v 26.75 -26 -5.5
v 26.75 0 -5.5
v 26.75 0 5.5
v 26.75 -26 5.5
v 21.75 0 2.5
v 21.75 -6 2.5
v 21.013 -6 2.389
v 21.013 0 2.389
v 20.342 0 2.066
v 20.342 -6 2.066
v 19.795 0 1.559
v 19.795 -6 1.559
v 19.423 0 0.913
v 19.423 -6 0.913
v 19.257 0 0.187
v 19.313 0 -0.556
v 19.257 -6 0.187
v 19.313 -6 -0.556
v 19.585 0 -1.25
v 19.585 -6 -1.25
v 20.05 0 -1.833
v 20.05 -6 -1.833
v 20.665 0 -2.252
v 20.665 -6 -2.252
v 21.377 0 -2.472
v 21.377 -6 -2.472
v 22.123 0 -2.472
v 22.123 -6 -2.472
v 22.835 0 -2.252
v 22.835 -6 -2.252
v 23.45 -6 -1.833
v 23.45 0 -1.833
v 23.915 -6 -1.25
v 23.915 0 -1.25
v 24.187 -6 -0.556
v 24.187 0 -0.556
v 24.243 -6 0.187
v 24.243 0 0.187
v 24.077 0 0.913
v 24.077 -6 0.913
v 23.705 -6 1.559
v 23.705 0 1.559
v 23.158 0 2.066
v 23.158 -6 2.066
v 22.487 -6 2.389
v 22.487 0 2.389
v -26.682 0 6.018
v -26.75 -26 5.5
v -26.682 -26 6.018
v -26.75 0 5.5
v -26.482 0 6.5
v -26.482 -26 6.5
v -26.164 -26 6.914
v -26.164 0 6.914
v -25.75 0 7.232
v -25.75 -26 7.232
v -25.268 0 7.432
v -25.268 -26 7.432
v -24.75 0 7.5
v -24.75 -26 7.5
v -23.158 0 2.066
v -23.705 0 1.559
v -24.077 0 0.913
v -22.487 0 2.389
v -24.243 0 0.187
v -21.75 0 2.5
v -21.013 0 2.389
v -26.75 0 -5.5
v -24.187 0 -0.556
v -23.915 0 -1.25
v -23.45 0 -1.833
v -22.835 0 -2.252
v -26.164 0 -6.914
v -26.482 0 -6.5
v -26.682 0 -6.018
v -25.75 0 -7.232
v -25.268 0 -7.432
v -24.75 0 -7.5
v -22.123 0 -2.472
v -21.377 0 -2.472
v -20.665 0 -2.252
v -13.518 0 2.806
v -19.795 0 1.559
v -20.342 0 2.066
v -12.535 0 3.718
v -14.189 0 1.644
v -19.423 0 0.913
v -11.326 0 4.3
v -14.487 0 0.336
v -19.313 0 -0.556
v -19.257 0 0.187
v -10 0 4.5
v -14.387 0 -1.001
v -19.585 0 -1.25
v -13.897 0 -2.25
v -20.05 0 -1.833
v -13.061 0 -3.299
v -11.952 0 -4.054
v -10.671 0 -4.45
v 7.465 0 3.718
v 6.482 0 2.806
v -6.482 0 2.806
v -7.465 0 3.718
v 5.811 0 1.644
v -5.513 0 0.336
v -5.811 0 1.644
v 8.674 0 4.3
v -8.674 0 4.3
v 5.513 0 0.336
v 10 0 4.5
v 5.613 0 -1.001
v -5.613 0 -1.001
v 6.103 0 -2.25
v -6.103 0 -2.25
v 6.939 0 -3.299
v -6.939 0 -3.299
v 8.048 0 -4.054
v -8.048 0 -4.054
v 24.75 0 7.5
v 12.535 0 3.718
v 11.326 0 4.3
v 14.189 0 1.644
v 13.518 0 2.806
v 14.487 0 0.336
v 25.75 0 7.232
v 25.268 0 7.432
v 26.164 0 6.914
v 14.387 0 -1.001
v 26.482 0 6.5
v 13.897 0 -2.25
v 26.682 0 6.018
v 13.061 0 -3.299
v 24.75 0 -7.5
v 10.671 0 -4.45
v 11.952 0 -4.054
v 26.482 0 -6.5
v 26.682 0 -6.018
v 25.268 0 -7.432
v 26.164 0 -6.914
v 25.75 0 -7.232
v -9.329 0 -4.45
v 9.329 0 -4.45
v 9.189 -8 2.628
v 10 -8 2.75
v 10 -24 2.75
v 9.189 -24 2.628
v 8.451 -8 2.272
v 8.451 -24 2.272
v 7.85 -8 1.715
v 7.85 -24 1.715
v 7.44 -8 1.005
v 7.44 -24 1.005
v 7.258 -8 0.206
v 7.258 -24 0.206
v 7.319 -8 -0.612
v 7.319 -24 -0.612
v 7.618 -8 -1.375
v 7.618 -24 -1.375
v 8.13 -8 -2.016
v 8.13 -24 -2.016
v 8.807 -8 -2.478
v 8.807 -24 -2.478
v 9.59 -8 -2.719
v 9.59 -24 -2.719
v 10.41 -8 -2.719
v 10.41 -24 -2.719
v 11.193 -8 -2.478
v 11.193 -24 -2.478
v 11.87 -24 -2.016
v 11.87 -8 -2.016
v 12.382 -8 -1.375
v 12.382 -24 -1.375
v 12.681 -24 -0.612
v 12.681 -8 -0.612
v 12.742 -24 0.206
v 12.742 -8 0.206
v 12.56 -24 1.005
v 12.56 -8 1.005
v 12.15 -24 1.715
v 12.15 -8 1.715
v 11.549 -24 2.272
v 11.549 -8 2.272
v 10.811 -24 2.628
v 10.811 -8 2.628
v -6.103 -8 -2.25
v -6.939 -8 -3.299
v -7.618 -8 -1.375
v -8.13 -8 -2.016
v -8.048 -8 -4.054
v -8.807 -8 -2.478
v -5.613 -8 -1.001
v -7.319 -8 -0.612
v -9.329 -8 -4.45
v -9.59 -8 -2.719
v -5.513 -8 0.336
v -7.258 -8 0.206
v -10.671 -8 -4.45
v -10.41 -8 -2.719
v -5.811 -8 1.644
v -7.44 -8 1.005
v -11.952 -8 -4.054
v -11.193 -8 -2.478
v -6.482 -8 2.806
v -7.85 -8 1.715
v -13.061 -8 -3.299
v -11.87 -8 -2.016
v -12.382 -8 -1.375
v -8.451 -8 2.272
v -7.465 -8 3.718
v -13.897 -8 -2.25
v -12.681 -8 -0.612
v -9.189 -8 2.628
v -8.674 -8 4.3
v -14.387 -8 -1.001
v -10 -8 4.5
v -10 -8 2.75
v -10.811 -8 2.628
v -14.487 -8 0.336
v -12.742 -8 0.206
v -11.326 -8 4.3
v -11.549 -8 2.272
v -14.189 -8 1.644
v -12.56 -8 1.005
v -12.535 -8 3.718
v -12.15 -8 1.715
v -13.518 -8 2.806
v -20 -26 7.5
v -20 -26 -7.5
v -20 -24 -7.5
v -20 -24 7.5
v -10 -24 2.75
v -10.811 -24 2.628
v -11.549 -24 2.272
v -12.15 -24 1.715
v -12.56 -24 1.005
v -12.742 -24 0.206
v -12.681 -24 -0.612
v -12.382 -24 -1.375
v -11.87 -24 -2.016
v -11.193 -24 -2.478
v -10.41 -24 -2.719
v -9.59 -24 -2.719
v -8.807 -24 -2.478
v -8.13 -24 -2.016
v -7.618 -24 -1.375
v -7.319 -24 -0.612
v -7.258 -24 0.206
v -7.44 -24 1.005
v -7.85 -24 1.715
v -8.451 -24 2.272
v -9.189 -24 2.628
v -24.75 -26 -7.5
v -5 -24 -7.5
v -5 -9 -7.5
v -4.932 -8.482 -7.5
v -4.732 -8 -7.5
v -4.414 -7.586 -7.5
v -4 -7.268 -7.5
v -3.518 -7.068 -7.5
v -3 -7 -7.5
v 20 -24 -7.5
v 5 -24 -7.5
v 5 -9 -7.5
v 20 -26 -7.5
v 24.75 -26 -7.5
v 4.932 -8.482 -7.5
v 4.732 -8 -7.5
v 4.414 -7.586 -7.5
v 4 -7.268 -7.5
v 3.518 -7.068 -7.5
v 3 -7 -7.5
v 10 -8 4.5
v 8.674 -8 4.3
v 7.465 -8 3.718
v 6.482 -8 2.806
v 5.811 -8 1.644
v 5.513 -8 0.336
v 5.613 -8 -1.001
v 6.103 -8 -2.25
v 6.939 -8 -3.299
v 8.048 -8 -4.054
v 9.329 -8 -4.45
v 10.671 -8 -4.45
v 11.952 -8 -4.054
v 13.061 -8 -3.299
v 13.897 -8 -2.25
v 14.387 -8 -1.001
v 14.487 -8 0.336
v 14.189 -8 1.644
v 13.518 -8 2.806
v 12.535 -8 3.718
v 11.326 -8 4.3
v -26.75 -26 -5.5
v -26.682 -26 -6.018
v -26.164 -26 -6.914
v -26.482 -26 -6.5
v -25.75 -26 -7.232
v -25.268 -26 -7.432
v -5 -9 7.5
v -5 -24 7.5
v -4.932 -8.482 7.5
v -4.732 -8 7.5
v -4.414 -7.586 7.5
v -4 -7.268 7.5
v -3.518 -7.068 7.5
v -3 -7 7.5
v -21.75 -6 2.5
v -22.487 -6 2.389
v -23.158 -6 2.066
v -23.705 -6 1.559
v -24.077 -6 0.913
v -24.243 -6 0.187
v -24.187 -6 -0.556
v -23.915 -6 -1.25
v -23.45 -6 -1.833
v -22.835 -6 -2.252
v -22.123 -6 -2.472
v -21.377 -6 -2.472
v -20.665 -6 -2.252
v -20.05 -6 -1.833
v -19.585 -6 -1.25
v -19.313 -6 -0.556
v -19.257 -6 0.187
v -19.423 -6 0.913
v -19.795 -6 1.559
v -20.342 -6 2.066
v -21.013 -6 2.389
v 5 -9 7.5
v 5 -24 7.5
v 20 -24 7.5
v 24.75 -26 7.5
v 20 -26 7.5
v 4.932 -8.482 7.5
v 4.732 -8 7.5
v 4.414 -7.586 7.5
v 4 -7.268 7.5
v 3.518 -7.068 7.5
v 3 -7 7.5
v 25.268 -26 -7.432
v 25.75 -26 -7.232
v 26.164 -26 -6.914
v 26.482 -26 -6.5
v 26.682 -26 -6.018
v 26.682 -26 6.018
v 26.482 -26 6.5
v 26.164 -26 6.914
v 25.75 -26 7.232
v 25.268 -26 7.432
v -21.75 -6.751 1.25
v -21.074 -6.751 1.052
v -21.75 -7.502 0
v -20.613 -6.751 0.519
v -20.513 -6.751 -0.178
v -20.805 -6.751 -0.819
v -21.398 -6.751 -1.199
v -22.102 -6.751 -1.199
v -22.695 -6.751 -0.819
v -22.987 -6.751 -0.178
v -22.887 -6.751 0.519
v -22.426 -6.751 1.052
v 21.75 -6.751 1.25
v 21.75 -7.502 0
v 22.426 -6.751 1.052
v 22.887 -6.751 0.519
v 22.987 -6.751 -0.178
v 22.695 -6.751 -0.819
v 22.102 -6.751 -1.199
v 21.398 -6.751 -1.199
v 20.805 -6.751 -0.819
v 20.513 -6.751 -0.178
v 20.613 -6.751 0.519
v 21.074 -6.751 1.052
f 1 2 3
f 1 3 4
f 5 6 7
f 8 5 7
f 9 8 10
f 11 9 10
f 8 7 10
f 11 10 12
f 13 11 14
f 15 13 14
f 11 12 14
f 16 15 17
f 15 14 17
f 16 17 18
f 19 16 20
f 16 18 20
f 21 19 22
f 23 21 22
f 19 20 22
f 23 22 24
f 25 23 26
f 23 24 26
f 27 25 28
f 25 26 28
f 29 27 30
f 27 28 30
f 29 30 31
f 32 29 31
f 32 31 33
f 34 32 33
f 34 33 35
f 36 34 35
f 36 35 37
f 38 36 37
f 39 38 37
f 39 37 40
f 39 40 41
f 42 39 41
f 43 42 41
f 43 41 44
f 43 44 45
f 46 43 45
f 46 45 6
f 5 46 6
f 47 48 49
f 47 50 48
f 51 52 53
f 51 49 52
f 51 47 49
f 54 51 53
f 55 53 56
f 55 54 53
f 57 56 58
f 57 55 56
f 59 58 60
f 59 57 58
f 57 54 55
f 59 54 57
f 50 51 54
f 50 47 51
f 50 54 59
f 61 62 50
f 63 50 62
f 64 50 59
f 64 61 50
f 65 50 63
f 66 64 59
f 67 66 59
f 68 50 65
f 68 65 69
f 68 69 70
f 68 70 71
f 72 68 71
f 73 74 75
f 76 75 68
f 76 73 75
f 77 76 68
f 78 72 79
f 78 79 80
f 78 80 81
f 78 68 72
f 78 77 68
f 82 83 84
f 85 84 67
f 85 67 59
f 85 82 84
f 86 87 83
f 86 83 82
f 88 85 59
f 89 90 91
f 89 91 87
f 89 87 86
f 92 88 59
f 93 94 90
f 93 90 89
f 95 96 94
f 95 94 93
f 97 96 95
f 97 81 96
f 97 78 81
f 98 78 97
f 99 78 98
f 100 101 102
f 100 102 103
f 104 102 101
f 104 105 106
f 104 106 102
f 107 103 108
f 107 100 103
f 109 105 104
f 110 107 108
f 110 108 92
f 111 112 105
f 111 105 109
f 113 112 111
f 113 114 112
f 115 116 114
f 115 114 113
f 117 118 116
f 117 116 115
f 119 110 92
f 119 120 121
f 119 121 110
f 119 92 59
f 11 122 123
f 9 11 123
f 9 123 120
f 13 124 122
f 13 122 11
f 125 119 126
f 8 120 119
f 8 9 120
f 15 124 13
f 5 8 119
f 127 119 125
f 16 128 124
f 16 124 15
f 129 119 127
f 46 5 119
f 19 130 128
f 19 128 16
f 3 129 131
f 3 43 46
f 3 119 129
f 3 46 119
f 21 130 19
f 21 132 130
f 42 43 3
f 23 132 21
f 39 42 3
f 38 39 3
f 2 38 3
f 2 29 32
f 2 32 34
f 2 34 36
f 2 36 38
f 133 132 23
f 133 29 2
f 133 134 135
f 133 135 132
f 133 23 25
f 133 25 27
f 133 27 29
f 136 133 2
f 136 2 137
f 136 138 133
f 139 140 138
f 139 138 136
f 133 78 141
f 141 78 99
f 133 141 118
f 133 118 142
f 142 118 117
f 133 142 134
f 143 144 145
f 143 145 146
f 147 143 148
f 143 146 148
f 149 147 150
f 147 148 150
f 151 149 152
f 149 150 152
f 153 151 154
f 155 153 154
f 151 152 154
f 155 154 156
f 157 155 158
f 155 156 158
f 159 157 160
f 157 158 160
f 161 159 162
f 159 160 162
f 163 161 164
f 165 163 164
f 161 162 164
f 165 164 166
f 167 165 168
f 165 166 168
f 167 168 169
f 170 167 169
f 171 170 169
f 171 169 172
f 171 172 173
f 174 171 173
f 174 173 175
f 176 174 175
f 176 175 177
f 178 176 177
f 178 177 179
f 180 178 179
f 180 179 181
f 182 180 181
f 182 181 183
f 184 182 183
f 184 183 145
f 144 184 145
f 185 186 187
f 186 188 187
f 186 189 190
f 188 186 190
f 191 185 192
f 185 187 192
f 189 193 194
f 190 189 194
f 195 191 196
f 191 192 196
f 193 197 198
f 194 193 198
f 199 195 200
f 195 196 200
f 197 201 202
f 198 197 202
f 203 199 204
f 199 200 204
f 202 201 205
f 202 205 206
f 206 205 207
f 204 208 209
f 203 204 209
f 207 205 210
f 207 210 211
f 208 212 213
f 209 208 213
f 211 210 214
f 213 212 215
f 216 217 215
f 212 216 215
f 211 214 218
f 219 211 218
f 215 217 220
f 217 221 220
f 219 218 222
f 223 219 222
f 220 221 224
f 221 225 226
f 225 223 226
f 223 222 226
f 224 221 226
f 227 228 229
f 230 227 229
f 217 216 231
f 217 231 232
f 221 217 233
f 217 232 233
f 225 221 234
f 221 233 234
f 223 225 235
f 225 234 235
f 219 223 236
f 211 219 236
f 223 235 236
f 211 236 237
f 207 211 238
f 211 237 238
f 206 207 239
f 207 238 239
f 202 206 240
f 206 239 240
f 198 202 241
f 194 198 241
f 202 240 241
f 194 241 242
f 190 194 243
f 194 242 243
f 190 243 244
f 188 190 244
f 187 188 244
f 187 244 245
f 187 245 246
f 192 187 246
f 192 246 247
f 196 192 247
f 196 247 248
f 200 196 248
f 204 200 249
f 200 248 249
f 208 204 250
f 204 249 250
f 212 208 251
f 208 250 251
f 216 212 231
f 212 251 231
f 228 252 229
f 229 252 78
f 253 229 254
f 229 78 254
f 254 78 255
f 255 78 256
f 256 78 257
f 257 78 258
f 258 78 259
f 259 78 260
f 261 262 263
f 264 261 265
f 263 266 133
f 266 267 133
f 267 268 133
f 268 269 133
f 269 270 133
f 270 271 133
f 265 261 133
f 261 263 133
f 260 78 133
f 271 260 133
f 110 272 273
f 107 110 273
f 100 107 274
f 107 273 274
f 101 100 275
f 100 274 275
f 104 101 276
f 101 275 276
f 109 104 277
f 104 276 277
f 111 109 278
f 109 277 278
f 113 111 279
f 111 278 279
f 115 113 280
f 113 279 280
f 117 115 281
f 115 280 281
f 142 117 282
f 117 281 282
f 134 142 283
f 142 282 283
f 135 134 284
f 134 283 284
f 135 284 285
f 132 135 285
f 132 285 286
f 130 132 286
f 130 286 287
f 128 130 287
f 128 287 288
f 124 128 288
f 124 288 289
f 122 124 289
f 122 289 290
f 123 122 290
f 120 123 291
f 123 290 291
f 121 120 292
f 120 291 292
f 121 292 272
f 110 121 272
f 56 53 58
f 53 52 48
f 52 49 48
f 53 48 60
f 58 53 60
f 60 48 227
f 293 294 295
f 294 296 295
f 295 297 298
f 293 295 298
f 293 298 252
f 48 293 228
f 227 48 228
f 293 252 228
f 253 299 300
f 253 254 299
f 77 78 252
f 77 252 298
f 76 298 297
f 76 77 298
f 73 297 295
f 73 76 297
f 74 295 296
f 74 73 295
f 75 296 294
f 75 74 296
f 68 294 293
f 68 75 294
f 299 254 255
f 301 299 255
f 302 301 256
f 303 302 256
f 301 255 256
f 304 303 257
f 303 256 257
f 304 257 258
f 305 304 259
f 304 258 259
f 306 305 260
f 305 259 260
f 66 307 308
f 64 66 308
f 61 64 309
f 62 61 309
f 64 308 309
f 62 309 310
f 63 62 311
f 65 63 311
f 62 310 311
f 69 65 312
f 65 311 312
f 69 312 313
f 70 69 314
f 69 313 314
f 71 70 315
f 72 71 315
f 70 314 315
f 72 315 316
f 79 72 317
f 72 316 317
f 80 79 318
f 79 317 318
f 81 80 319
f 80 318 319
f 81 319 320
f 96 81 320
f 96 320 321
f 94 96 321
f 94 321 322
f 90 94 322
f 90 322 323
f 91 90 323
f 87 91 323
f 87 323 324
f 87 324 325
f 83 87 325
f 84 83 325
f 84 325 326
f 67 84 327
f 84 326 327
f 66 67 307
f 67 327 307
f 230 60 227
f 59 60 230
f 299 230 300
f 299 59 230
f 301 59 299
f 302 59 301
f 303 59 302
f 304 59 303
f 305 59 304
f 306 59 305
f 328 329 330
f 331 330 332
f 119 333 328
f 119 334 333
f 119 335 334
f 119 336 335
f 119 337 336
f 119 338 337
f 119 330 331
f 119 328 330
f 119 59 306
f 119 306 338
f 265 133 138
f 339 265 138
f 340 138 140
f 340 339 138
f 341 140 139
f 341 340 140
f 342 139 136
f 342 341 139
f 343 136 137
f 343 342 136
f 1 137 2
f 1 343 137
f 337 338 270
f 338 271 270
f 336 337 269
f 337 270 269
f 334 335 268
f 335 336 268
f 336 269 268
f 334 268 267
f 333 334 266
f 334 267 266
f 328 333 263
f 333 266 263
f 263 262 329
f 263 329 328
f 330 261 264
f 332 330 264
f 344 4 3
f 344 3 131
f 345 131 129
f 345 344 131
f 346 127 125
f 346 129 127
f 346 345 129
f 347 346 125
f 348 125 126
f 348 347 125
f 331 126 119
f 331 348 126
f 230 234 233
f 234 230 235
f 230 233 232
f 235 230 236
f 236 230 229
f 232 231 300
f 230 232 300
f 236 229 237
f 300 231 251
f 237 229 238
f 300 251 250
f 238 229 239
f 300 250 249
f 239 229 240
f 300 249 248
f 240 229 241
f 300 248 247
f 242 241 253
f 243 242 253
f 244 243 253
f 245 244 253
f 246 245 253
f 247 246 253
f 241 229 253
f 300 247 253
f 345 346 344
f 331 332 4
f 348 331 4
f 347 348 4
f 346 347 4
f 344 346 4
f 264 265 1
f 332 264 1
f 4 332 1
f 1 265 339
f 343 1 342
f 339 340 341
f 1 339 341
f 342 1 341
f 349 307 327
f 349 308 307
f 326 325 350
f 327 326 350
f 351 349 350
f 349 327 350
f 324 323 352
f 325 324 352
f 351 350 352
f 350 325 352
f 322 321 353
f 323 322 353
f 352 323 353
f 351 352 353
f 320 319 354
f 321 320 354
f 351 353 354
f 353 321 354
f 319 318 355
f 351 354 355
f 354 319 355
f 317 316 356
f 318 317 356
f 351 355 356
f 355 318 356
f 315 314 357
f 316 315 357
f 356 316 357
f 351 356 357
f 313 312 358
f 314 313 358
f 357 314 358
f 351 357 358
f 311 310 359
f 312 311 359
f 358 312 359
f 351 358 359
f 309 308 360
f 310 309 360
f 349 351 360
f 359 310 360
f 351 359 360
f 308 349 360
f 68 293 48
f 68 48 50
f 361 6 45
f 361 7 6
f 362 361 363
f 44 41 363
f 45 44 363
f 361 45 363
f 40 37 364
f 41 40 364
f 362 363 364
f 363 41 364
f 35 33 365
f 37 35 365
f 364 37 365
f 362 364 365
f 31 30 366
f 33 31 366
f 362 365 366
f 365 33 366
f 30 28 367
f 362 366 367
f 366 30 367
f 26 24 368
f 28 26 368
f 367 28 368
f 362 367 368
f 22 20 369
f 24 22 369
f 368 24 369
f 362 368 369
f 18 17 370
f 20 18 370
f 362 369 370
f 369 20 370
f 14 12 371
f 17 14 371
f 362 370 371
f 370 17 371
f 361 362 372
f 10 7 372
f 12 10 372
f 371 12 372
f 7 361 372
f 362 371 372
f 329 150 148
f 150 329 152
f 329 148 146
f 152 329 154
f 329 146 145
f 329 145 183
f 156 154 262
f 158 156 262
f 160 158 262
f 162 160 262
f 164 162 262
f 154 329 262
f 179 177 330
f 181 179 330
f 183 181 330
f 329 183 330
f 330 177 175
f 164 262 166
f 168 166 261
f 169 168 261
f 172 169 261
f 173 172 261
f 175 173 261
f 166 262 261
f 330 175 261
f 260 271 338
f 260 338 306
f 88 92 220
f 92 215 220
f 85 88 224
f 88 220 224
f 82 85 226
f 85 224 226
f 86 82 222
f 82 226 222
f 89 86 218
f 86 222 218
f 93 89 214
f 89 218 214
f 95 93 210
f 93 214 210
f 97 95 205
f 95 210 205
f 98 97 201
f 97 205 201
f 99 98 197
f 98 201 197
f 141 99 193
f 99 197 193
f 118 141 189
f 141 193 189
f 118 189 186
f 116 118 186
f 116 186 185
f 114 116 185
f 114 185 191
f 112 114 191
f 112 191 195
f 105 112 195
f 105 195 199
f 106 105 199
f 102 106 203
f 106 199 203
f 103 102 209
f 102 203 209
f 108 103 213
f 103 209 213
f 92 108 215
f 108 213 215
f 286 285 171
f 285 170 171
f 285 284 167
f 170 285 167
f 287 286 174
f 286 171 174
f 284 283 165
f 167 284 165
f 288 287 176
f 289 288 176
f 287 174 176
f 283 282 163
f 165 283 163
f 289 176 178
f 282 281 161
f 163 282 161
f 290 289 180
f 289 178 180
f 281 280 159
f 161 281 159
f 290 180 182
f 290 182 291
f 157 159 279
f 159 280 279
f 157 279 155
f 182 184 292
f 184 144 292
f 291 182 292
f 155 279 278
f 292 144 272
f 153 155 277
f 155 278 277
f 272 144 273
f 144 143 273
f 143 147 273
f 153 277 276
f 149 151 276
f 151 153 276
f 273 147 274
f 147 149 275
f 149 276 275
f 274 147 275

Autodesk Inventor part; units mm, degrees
ref_plane "YZ Plane" through (0, 0, 0) normal (1, 0, 0) x (0, 1, 0)
ref_plane "XZ Plane" through (0, 0, 0) normal (0, 1, 0) x (-1, 0, 0)
ref_plane "XY Plane" through (0, 0, 0) normal (0, 0, 1) x (1, 0, 0)
sketch "スケッチ1" plane through (0, 0, 0) normal (0, 0, 1) x (1, 0, 0)
  line L0 (-26.75, 0) -> (26.75, 0)
  line L1 (26.75, 0) -> (26.75, -26)
  line L2 (5, -24) -> (5, -7)
  line L3 (5, -7) -> (-5, -7)
  line L4 (-5, -7) -> (-5, -24)
  line L5 (-26.75, -26) -> (-26.75, 0)
  line L6 (-26.75, -26) -> (-20, -26)
  line L7 (-20, -26) -> (-20, -24)
  line L8 (-20, -24) -> (-5, -24)
  line L9 (5, -24) -> (20, -24)
  line L10 (20, -24) -> (20, -26)
  line L11 (20, -26) -> (26.75, -26)
  point P0 (0, 0)
  dimension "d0" = 53.5
  dimension "d1" = 10
  dimension "d2" = 5
  dimension "d3" = 26.75
  dimension "d4" = 40
  dimension "d5" = 20
  dimension "d6" = 17
  dimension "d7" = 2
  dimension "d29" = 24
extrude "押し出し1" add sketch "スケッチ1" along normal mid plane 15
sketch "スケッチ2" plane through (-26.75, 0, 7.5) normal (0, 1, 0) x (1, 0, 0)
  point P0 (26.75, 7.5)
  point P1 (16.75, 7.5)
  point P2 (36.75, 7.5)
  dimension "d11" = 10
  dimension "d12" = 10
hole "穴1" at (-10, 0, 0) at (10, 0, 0) direction (0, -1, 0) diameter 5.5 end through all counterbore diameter 9 counterbore depth 8 clearance for "Socket Head Cap Screw" size "M5" standard "Ansi Metric M Profile"
sketch "スケッチ3" plane through (-26.75, 0, 7.5) normal (0, 1, 0) x (1, 0, 0)
  point P0 (26.75, 7.5)
  point P1 (5, 7.5)
  point P2 (48.5, 7.5)
  dimension "d20" = 21.75
  dimension "d21" = 21.75
hole "穴2" at (-21.75, 0, 0) at (21.75, 0, 0) direction (0, -1, 0) diameter 5 depth 6 tip angle 118
fillet "フィレット1" radius 2 4 edges at (-26.75, -13, -7.5) (-26.75, -13, 7.5) (26.75, -13, -7.5) (26.75, -13, 7.5)
fillet "フィレット2" radius 2 2 edges at (5, -7, 0) (-5, -7, 0)
equation "\"d2\" = 0.5 * d1"
equation "\"d3\" = 0.5 * d0"
equation "\"d5\" = 0.5 * d4"
equation "\"d12\" = d11"
equation "\"d21\" = d20"
properties part number "scara-base7" material "ABS プラスチック"
